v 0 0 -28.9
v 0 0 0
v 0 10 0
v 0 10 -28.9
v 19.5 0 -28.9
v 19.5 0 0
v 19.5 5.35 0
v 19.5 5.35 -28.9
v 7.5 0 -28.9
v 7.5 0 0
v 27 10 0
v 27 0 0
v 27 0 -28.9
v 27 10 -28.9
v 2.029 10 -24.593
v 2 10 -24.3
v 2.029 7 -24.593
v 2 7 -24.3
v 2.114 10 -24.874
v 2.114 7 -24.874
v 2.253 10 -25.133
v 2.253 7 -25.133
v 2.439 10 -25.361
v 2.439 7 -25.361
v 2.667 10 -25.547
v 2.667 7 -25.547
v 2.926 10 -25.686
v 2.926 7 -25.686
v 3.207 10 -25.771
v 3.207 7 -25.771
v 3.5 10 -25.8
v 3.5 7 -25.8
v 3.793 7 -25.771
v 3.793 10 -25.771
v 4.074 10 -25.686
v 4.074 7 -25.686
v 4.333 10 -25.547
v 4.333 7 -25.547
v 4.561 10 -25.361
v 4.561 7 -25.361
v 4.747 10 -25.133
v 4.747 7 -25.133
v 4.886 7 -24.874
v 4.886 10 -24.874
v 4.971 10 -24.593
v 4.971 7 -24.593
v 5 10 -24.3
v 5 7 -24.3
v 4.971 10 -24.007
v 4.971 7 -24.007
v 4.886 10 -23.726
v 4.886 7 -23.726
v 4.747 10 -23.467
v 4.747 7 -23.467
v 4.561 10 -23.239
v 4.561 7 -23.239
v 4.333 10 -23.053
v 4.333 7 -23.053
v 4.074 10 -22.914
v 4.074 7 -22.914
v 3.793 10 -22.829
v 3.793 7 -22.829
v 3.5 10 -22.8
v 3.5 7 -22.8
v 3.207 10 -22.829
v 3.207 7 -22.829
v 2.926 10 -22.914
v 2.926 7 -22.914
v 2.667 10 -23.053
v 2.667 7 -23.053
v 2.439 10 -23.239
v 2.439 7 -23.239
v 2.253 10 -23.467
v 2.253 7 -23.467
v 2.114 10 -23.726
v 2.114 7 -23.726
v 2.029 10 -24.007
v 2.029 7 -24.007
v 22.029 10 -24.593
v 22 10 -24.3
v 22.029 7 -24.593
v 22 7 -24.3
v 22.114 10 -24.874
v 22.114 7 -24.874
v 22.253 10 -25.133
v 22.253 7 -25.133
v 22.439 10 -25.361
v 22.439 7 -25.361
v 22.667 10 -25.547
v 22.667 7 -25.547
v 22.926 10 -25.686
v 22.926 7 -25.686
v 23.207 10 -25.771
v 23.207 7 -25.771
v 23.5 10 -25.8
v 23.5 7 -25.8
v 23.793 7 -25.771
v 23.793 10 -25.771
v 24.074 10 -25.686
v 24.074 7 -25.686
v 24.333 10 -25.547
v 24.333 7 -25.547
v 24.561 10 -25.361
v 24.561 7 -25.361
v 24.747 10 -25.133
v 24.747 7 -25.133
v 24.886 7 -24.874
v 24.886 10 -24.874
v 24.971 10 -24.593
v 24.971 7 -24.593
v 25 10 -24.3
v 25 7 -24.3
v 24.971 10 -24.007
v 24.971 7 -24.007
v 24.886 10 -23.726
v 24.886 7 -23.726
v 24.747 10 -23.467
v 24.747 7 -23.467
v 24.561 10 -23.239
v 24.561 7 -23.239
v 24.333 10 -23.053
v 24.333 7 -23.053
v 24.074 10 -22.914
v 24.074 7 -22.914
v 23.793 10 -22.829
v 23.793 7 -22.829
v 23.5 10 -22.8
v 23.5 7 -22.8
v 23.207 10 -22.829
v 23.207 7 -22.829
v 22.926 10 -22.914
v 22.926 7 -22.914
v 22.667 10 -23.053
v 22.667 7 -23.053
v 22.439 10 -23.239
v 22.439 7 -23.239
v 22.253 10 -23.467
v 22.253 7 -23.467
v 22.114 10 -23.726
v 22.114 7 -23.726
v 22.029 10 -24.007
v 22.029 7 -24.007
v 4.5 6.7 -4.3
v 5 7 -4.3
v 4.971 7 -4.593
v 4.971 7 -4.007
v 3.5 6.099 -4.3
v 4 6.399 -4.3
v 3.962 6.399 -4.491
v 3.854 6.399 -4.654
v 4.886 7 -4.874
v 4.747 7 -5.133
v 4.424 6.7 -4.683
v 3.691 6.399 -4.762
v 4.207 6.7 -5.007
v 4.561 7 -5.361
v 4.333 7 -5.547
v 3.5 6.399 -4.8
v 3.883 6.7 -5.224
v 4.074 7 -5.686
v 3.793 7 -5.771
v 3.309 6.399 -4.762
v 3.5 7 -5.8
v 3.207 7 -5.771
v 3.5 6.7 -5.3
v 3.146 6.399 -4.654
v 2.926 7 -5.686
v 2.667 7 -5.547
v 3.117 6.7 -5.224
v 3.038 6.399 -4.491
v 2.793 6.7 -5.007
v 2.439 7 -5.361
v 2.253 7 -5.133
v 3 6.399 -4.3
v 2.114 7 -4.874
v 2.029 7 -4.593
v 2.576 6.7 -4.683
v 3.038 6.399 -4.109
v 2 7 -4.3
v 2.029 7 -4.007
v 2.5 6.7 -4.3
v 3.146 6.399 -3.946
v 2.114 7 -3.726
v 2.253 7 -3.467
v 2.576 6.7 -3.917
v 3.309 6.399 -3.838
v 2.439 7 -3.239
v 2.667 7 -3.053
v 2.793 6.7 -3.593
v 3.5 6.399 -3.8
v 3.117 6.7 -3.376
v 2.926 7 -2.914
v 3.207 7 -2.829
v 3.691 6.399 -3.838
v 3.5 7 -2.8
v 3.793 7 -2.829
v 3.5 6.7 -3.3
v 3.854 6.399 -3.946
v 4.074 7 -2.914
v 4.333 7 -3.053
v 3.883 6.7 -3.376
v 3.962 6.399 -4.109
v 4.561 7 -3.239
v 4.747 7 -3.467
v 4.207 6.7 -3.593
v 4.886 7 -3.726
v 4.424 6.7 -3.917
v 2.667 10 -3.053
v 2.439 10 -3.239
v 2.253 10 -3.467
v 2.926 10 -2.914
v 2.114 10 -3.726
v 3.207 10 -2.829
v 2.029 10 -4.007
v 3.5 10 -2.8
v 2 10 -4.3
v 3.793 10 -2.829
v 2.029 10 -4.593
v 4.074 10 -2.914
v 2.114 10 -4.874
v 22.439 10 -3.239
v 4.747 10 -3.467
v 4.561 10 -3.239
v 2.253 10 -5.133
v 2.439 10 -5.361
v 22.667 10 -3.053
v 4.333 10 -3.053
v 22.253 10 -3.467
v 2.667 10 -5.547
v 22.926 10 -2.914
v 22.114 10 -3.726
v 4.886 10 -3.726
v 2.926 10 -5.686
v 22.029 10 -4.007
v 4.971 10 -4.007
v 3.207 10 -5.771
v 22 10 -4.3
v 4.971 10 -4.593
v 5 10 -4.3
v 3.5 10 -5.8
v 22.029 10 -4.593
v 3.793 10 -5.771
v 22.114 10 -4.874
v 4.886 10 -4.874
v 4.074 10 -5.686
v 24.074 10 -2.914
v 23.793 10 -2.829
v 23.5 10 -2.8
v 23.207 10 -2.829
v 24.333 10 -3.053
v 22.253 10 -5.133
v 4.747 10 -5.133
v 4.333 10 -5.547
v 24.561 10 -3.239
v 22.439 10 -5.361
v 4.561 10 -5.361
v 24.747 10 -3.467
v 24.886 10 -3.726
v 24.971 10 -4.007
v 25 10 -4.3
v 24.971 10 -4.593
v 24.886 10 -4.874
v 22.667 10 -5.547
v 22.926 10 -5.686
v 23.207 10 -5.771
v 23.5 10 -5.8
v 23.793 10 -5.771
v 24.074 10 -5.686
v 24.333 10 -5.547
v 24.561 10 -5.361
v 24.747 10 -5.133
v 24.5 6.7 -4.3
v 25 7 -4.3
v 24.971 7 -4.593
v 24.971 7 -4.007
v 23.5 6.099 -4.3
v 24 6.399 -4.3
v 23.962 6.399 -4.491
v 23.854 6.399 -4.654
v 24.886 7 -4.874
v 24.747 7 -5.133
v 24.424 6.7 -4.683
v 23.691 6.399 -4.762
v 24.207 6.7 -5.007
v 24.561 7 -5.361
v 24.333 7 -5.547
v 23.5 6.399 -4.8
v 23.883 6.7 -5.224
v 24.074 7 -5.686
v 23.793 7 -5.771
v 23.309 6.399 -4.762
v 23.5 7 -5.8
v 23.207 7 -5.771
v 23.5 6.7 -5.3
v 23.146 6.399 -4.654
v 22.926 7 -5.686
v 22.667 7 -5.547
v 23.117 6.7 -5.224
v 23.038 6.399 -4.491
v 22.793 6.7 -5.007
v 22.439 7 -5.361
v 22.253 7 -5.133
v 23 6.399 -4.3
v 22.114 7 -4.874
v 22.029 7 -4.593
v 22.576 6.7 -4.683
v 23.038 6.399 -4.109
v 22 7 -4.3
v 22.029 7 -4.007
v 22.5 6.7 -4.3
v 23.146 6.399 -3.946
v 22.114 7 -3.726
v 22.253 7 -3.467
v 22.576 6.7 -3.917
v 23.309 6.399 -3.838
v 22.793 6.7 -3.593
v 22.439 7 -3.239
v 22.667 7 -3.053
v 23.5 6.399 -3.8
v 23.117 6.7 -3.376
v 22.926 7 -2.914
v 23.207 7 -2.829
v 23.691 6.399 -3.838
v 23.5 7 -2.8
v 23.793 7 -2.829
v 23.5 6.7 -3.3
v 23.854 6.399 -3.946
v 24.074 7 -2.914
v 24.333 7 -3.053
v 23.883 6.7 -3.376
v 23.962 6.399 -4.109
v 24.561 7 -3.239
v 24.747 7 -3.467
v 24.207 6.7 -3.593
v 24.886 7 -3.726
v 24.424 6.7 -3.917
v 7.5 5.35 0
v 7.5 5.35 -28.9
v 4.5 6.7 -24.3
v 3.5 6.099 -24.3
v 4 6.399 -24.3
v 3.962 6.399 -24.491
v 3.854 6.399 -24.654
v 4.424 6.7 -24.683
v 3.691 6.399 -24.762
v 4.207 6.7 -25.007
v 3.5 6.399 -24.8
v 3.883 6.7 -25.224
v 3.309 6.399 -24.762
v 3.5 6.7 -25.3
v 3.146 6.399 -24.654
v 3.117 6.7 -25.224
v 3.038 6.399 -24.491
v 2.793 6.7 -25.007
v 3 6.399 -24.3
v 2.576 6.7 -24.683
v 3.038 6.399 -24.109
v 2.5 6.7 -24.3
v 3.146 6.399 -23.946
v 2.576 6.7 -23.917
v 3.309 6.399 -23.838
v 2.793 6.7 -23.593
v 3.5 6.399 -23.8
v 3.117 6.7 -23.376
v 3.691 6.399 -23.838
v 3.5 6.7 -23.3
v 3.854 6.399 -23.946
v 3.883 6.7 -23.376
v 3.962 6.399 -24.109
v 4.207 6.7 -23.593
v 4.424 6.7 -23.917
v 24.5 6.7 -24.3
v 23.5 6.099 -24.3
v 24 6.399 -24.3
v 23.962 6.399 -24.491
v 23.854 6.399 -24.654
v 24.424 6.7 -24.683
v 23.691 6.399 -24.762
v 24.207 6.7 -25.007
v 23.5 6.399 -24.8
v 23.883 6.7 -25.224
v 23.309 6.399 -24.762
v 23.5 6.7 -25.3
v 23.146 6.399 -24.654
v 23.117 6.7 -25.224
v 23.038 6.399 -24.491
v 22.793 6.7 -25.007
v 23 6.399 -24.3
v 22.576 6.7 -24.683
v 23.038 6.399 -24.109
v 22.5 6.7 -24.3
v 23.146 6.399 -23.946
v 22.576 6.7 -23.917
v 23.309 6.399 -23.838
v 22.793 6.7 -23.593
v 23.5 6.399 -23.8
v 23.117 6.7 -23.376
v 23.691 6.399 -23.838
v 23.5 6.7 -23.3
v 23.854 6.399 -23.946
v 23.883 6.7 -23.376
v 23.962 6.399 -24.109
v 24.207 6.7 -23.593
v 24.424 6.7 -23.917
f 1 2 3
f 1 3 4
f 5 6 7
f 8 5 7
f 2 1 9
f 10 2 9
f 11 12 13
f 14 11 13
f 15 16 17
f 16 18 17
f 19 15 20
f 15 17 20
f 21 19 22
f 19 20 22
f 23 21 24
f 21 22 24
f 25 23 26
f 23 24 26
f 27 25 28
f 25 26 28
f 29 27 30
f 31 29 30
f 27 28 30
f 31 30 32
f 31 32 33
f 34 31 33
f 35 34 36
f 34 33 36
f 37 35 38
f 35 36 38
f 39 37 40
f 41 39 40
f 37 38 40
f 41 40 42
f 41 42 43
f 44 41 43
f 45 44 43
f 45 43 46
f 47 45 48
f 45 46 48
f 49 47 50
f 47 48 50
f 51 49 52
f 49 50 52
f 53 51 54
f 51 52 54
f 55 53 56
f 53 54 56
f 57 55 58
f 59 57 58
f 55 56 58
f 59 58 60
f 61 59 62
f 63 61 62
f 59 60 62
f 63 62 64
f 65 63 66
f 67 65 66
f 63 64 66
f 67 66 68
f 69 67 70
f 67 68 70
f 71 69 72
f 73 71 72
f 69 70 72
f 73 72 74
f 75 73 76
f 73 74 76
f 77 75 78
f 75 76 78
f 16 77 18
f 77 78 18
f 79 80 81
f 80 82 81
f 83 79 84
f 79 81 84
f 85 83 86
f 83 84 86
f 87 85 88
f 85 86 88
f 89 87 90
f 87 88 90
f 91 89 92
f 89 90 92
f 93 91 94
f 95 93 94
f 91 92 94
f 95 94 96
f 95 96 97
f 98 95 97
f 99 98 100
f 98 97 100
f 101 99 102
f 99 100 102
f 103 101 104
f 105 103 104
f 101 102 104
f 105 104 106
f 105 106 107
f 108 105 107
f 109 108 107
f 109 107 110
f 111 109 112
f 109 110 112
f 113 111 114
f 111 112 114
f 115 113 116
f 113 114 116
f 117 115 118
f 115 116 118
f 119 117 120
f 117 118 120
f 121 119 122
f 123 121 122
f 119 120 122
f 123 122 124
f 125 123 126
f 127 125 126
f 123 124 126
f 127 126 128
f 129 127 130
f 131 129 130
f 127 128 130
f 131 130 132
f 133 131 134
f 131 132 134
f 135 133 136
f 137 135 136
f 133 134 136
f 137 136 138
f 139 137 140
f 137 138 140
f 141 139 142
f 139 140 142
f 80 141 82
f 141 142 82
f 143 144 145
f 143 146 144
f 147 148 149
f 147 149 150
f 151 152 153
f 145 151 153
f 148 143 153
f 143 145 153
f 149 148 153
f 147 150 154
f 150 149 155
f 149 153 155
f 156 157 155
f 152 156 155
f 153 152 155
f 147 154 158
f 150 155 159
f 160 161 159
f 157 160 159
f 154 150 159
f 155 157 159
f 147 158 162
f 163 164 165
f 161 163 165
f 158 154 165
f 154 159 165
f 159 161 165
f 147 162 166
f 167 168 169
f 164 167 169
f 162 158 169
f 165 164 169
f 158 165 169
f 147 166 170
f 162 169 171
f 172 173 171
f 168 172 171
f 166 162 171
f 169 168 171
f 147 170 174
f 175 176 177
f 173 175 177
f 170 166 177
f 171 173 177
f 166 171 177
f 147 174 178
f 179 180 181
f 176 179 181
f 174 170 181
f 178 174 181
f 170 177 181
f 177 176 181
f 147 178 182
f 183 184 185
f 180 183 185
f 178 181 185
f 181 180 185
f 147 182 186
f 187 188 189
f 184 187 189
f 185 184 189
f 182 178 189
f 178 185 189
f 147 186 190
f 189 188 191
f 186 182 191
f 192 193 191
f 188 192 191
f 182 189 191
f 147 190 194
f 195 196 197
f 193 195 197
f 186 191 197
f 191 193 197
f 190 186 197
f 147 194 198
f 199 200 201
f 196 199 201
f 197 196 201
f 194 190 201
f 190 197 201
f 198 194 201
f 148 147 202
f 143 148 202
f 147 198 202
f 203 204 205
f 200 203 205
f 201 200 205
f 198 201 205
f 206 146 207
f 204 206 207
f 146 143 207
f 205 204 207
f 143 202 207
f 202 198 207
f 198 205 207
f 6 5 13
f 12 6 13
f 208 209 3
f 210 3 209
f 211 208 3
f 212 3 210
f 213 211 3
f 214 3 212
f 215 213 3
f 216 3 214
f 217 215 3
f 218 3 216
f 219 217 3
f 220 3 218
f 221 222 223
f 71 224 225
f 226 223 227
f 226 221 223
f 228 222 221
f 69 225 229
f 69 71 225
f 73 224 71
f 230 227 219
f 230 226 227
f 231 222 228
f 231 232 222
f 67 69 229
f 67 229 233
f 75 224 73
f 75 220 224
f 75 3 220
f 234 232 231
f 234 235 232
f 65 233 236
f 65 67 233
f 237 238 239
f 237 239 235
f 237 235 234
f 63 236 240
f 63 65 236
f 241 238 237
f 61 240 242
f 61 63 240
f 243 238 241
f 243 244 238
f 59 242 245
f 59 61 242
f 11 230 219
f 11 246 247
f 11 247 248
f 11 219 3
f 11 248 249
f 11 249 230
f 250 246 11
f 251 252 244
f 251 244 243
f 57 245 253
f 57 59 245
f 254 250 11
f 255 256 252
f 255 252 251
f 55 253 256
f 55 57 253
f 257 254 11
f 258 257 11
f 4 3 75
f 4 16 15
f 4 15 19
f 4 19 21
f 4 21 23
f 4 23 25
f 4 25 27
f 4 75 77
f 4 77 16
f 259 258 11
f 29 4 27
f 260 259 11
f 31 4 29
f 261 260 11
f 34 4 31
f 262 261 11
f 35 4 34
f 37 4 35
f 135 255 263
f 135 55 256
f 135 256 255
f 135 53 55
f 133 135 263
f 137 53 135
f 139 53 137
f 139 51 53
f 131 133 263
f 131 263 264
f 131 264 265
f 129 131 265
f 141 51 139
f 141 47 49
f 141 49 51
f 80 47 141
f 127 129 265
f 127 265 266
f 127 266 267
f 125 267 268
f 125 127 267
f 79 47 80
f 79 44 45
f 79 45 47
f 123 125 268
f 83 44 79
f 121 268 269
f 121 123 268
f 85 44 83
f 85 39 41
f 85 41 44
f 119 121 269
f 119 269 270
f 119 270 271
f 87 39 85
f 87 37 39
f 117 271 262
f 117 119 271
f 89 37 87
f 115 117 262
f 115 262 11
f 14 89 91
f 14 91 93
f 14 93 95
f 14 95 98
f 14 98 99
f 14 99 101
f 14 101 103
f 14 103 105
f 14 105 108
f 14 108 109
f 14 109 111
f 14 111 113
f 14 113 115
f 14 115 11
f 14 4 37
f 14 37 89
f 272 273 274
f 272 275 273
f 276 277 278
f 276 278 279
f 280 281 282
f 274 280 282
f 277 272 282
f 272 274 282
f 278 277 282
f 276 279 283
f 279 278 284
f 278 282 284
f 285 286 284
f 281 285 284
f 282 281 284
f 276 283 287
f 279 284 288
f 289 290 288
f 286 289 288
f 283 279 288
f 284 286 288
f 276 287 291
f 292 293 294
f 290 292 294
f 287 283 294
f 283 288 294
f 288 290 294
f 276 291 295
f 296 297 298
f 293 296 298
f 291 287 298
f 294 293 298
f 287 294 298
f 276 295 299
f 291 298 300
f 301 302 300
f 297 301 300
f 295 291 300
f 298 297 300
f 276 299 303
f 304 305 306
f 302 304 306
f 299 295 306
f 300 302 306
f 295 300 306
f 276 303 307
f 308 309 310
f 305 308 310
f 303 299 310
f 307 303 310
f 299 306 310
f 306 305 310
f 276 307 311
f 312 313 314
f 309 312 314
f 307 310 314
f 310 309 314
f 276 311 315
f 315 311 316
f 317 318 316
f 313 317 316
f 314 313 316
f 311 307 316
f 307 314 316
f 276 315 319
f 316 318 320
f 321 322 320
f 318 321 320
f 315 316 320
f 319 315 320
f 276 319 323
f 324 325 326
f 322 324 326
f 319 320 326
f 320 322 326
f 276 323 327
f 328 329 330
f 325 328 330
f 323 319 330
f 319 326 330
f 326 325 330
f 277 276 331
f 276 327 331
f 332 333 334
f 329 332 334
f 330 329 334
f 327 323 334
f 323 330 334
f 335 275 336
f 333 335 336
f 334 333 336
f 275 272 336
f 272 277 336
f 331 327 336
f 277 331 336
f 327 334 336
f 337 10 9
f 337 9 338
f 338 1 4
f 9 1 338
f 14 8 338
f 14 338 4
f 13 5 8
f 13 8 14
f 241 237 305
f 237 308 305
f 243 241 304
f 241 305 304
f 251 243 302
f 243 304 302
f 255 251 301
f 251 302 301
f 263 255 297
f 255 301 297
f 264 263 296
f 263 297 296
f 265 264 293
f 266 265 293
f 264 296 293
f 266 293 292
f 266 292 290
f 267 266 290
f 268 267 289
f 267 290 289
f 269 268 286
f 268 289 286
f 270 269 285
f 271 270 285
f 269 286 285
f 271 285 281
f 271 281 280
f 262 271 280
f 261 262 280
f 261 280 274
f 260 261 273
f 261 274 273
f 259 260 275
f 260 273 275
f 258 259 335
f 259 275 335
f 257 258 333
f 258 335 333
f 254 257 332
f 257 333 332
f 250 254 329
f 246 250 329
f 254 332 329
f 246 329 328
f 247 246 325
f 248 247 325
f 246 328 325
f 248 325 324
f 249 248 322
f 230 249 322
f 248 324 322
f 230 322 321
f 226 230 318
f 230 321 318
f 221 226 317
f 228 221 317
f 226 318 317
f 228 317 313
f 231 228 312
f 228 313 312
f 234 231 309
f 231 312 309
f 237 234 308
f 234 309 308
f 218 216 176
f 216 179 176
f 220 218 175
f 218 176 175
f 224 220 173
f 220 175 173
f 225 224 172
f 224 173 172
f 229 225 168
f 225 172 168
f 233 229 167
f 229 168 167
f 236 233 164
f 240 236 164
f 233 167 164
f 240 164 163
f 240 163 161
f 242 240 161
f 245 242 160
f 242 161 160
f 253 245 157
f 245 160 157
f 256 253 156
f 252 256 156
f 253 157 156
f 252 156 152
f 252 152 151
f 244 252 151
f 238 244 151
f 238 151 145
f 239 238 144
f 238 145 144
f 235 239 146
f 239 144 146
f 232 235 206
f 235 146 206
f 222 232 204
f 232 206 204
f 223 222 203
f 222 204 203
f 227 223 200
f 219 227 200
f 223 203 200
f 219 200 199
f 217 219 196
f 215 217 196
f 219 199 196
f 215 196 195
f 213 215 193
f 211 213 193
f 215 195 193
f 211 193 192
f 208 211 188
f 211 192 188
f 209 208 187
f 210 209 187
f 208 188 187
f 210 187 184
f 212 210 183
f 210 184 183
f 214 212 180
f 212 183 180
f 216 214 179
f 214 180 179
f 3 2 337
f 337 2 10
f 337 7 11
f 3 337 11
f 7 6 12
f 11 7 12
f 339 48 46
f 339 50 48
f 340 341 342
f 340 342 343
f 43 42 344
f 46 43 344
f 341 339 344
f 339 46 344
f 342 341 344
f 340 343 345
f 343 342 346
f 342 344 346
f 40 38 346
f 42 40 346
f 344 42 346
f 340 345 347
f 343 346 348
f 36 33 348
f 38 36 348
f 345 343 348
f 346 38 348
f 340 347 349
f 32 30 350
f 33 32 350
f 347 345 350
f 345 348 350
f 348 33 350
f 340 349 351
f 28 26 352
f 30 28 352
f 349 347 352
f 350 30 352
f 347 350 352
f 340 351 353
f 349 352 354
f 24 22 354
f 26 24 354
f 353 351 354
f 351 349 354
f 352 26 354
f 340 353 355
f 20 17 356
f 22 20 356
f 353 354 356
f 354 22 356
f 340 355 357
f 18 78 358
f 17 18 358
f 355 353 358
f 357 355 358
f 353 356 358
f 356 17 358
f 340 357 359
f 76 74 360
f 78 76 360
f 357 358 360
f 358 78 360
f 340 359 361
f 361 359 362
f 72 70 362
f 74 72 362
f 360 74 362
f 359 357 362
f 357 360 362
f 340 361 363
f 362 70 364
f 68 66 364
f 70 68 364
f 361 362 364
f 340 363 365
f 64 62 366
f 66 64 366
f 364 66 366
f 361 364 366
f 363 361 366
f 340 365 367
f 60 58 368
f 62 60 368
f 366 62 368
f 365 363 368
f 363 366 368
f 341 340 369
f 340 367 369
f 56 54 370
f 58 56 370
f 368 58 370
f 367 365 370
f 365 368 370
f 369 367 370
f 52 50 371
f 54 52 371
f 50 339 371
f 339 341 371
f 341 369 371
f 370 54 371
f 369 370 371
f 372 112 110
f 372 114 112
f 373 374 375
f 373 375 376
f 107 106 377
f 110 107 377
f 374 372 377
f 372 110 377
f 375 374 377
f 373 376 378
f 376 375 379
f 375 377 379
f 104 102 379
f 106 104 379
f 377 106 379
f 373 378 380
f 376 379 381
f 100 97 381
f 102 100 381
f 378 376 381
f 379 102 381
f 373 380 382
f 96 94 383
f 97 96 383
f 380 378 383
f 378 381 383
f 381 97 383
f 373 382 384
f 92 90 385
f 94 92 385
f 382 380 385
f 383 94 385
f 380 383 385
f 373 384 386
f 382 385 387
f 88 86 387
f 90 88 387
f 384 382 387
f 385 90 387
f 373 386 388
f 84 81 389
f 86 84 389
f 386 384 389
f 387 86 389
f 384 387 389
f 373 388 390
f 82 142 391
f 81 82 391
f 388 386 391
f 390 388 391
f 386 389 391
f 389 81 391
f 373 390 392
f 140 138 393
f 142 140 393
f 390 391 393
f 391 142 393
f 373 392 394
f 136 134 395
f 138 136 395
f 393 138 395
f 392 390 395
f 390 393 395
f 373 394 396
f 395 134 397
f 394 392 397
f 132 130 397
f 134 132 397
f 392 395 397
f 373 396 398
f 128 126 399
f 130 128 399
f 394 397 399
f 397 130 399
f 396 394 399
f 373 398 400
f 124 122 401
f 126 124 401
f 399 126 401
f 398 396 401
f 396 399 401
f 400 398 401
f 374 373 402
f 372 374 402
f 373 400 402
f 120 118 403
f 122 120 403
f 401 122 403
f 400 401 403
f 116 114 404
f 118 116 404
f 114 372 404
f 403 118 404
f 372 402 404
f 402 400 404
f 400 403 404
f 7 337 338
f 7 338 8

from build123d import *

# Parameters (mm, degrees)
SKETCH1_W                 = 27
SKETCH1_H                 = 28.9
BOSS_EXTRUDE1_DEPTH       = 10
SKETCH2_W                 = 12
SKETCH2_H                 = 5.35
CUT_EXTRUDE1_DEPTH        = 1
CUT_EXTRUDE1_DEPTH_BACK   = 29.9
F_3_0MM_DOWEL_HOLE1_D     = 3
F_3_0MM_DOWEL_HOLE1_DEPTH = 3
F_3_0MM_DOWEL_HOLE1_TIP   = 0.901290929


with BuildPart() as part:
    # Sketch1 → Boss-Extrude1 (new body)
    with BuildSketch(Plane(origin=(0, 0, 0), x_dir=(1, 0, 0), z_dir=(0, 1, 0))):
        with Locations((13.5, 14.45)):
            Rectangle(SKETCH1_W, SKETCH1_H)
    extrude(amount=BOSS_EXTRUDE1_DEPTH)

    # Sketch2 → Cut-Extrude1 (cut, two sides)
    with BuildSketch(Plane.XY) as cut_extrude1_sk:
        with Locations((13.5, 2.675)):
            Rectangle(SKETCH2_W, SKETCH2_H)
    extrude(amount=CUT_EXTRUDE1_DEPTH, mode=Mode.SUBTRACT)
    extrude(cut_extrude1_sk.sketch, amount=-CUT_EXTRUDE1_DEPTH_BACK, mode=Mode.SUBTRACT)

    # Ø3.0mm Dowel Hole1
    with Locations(Plane(origin=(0, 10, 0), x_dir=(1, 0, 0), z_dir=(0, 1, 0))):
        with Locations((3.5, 24.3), (23.5, 24.3), (3.5, 4.3), (23.5, 4.3)):
            Hole(F_3_0MM_DOWEL_HOLE1_D / 2, depth=F_3_0MM_DOWEL_HOLE1_DEPTH)
            with Locations((0, 0, -(F_3_0MM_DOWEL_HOLE1_DEPTH + F_3_0MM_DOWEL_HOLE1_TIP / 2))):  # 118° drill point
                Cone(0, F_3_0MM_DOWEL_HOLE1_D / 2, F_3_0MM_DOWEL_HOLE1_TIP, mode=Mode.SUBTRACT)


solid = part.part
